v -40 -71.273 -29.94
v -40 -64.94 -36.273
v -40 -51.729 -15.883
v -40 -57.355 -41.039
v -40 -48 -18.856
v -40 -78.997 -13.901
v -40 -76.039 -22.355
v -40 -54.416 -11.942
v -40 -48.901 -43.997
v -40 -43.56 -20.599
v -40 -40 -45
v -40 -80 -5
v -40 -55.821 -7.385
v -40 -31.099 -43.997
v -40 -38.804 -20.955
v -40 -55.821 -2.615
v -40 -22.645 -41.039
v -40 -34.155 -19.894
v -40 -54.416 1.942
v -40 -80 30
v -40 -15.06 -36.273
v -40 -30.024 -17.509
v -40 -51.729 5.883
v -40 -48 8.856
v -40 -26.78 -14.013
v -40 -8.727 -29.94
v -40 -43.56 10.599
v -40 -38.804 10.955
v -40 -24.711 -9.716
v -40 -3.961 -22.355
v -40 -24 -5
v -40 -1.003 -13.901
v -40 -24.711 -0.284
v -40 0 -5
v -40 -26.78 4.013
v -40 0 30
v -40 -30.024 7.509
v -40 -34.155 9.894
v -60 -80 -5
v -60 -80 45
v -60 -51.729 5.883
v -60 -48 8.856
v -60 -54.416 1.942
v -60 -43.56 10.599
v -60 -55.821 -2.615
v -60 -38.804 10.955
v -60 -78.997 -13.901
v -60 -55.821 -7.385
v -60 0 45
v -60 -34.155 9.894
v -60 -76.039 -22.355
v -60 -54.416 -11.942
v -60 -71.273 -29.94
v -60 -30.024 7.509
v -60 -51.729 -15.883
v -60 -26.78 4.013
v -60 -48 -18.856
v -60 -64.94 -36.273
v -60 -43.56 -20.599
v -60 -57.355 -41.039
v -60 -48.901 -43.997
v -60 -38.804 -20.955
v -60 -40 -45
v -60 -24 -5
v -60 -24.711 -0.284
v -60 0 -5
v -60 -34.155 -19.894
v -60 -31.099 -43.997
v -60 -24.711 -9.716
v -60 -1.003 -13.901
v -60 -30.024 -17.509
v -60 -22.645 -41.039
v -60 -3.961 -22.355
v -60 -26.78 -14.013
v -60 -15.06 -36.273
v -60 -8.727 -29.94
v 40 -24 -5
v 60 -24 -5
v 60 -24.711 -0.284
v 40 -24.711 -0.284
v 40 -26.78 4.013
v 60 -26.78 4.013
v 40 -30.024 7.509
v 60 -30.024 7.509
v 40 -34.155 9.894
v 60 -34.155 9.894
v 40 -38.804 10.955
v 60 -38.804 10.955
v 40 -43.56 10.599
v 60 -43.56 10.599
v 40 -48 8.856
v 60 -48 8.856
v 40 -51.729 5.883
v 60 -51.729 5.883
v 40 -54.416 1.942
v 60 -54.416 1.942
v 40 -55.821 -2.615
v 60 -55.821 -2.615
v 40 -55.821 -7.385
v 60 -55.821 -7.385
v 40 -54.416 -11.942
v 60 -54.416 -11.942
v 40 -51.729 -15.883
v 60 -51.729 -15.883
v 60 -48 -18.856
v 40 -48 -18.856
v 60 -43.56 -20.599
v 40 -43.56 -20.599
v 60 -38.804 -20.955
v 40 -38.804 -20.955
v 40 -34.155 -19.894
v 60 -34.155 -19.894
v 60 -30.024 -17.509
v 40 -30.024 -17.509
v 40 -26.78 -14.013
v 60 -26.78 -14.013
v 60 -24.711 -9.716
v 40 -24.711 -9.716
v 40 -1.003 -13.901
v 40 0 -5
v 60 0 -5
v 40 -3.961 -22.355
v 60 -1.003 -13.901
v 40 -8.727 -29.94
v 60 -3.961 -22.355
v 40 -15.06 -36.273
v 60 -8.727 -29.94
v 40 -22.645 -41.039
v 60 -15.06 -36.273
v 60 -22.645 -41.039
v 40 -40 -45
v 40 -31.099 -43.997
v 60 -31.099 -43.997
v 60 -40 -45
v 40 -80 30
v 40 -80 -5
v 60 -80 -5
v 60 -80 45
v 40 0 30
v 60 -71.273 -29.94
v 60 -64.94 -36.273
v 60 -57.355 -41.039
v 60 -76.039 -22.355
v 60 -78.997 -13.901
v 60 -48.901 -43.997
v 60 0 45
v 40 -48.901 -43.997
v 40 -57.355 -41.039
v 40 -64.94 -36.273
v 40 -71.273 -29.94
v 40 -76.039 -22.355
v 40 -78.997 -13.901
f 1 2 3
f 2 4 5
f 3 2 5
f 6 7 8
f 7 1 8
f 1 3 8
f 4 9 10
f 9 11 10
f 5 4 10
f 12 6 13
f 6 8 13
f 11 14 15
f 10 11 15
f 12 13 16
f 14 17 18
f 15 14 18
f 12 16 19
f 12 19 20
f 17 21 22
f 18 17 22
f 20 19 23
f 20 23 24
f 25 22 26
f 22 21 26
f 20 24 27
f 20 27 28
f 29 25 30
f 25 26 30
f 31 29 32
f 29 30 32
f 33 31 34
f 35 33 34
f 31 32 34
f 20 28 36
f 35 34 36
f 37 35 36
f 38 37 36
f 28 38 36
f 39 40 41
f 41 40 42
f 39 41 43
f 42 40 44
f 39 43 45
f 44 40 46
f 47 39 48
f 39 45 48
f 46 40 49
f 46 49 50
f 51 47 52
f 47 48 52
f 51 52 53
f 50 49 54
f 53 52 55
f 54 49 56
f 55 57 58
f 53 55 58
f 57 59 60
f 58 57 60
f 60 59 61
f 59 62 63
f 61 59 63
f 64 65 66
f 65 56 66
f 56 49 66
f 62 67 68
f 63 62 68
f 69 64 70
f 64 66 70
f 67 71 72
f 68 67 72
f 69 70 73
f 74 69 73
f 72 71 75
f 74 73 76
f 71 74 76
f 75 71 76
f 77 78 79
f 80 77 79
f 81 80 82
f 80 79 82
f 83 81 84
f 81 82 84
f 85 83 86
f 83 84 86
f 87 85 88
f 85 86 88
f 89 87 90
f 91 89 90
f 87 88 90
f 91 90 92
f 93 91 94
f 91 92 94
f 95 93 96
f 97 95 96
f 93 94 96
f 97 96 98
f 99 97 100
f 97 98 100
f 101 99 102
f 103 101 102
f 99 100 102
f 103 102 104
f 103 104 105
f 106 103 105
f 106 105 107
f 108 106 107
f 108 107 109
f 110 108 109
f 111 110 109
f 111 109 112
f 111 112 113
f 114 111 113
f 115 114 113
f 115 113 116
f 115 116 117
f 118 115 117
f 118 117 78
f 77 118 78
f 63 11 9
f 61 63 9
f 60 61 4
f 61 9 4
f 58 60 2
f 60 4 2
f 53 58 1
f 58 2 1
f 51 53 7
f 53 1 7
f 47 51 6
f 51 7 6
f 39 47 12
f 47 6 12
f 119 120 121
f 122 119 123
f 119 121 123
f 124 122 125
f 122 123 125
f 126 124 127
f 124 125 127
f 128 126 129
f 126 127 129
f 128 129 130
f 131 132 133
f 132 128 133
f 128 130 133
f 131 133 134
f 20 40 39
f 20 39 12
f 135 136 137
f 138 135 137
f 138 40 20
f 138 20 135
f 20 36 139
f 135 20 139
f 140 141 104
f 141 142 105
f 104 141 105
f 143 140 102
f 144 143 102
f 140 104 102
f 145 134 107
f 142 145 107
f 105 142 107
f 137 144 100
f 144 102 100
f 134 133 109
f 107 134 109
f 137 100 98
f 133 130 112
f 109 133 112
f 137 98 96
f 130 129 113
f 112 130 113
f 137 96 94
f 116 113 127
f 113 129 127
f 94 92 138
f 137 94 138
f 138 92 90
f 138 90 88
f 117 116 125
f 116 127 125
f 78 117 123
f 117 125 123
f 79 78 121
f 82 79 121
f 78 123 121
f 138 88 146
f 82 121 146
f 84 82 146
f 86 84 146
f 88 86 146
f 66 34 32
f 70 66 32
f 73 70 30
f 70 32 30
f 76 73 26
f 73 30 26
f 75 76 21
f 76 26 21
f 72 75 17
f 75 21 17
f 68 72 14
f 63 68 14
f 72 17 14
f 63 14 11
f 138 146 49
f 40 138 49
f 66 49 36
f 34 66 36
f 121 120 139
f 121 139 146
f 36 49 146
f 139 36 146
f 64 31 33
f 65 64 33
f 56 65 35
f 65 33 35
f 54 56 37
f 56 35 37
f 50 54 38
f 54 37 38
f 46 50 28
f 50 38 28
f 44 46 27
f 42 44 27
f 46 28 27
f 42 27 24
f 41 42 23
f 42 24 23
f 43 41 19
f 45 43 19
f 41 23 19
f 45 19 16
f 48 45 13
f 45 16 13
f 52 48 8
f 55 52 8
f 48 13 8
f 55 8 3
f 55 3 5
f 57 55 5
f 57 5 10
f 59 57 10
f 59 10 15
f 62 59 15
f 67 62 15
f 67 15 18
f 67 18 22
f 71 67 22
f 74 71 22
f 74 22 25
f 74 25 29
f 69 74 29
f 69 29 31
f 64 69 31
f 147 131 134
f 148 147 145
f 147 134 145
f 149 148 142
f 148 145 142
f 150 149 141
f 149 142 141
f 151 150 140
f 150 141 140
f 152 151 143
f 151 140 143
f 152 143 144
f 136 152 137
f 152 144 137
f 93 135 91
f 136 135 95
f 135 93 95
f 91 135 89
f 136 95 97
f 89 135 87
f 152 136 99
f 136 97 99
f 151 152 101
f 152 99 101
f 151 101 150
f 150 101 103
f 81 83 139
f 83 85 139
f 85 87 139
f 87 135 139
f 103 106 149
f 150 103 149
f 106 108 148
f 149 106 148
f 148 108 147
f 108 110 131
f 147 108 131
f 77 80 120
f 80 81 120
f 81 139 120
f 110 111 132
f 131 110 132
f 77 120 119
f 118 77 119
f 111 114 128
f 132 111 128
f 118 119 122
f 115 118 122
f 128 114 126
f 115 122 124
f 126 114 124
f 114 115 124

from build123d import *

# Parameters (mm, degrees)
F1_DEPTH = 80
F2_R     = 16
F3_DEPTH = 120


# Not quite as in the source:
# - the program builds the solid bodies; features that only make, move or delete a surface that nothing else refers to are left out


with BuildPart() as f1:
    # F0 (on Front) → F1 (new body)
    with BuildSketch(Plane.XZ):
        Polygon((60, -45), (60, 45), (-60, 45), (-60, -45), (-40, -45), (-40, 30), (40, 30), (40, -45), align=None)
    extrude(amount=F1_DEPTH)

    # F2 (on face) → F3 (cut)
    with BuildSketch(Plane.YZ.offset(60)):
        with BuildLine():
            ThreePointArc((-40.0000000863, -45), (-68.284271278, -33.2842712169), (-80, -5))
            Line((-80, -5), (-80, -45))
            Line((-80, -45), (-40.0000000863, -45))
        make_face()
        with BuildLine():
            Line((0, -45), (0, -5))
            ThreePointArc((0, -5), (-11.7157287831, -33.284271278), (-40.0000000863, -45))
            Line((-40.0000000863, -45), (0, -45))
        make_face()
        with Locations((-40, -5)):
            Circle(F2_R)
    extrude(amount=-F3_DEPTH, mode=Mode.SUBTRACT)


solid = f1.part
